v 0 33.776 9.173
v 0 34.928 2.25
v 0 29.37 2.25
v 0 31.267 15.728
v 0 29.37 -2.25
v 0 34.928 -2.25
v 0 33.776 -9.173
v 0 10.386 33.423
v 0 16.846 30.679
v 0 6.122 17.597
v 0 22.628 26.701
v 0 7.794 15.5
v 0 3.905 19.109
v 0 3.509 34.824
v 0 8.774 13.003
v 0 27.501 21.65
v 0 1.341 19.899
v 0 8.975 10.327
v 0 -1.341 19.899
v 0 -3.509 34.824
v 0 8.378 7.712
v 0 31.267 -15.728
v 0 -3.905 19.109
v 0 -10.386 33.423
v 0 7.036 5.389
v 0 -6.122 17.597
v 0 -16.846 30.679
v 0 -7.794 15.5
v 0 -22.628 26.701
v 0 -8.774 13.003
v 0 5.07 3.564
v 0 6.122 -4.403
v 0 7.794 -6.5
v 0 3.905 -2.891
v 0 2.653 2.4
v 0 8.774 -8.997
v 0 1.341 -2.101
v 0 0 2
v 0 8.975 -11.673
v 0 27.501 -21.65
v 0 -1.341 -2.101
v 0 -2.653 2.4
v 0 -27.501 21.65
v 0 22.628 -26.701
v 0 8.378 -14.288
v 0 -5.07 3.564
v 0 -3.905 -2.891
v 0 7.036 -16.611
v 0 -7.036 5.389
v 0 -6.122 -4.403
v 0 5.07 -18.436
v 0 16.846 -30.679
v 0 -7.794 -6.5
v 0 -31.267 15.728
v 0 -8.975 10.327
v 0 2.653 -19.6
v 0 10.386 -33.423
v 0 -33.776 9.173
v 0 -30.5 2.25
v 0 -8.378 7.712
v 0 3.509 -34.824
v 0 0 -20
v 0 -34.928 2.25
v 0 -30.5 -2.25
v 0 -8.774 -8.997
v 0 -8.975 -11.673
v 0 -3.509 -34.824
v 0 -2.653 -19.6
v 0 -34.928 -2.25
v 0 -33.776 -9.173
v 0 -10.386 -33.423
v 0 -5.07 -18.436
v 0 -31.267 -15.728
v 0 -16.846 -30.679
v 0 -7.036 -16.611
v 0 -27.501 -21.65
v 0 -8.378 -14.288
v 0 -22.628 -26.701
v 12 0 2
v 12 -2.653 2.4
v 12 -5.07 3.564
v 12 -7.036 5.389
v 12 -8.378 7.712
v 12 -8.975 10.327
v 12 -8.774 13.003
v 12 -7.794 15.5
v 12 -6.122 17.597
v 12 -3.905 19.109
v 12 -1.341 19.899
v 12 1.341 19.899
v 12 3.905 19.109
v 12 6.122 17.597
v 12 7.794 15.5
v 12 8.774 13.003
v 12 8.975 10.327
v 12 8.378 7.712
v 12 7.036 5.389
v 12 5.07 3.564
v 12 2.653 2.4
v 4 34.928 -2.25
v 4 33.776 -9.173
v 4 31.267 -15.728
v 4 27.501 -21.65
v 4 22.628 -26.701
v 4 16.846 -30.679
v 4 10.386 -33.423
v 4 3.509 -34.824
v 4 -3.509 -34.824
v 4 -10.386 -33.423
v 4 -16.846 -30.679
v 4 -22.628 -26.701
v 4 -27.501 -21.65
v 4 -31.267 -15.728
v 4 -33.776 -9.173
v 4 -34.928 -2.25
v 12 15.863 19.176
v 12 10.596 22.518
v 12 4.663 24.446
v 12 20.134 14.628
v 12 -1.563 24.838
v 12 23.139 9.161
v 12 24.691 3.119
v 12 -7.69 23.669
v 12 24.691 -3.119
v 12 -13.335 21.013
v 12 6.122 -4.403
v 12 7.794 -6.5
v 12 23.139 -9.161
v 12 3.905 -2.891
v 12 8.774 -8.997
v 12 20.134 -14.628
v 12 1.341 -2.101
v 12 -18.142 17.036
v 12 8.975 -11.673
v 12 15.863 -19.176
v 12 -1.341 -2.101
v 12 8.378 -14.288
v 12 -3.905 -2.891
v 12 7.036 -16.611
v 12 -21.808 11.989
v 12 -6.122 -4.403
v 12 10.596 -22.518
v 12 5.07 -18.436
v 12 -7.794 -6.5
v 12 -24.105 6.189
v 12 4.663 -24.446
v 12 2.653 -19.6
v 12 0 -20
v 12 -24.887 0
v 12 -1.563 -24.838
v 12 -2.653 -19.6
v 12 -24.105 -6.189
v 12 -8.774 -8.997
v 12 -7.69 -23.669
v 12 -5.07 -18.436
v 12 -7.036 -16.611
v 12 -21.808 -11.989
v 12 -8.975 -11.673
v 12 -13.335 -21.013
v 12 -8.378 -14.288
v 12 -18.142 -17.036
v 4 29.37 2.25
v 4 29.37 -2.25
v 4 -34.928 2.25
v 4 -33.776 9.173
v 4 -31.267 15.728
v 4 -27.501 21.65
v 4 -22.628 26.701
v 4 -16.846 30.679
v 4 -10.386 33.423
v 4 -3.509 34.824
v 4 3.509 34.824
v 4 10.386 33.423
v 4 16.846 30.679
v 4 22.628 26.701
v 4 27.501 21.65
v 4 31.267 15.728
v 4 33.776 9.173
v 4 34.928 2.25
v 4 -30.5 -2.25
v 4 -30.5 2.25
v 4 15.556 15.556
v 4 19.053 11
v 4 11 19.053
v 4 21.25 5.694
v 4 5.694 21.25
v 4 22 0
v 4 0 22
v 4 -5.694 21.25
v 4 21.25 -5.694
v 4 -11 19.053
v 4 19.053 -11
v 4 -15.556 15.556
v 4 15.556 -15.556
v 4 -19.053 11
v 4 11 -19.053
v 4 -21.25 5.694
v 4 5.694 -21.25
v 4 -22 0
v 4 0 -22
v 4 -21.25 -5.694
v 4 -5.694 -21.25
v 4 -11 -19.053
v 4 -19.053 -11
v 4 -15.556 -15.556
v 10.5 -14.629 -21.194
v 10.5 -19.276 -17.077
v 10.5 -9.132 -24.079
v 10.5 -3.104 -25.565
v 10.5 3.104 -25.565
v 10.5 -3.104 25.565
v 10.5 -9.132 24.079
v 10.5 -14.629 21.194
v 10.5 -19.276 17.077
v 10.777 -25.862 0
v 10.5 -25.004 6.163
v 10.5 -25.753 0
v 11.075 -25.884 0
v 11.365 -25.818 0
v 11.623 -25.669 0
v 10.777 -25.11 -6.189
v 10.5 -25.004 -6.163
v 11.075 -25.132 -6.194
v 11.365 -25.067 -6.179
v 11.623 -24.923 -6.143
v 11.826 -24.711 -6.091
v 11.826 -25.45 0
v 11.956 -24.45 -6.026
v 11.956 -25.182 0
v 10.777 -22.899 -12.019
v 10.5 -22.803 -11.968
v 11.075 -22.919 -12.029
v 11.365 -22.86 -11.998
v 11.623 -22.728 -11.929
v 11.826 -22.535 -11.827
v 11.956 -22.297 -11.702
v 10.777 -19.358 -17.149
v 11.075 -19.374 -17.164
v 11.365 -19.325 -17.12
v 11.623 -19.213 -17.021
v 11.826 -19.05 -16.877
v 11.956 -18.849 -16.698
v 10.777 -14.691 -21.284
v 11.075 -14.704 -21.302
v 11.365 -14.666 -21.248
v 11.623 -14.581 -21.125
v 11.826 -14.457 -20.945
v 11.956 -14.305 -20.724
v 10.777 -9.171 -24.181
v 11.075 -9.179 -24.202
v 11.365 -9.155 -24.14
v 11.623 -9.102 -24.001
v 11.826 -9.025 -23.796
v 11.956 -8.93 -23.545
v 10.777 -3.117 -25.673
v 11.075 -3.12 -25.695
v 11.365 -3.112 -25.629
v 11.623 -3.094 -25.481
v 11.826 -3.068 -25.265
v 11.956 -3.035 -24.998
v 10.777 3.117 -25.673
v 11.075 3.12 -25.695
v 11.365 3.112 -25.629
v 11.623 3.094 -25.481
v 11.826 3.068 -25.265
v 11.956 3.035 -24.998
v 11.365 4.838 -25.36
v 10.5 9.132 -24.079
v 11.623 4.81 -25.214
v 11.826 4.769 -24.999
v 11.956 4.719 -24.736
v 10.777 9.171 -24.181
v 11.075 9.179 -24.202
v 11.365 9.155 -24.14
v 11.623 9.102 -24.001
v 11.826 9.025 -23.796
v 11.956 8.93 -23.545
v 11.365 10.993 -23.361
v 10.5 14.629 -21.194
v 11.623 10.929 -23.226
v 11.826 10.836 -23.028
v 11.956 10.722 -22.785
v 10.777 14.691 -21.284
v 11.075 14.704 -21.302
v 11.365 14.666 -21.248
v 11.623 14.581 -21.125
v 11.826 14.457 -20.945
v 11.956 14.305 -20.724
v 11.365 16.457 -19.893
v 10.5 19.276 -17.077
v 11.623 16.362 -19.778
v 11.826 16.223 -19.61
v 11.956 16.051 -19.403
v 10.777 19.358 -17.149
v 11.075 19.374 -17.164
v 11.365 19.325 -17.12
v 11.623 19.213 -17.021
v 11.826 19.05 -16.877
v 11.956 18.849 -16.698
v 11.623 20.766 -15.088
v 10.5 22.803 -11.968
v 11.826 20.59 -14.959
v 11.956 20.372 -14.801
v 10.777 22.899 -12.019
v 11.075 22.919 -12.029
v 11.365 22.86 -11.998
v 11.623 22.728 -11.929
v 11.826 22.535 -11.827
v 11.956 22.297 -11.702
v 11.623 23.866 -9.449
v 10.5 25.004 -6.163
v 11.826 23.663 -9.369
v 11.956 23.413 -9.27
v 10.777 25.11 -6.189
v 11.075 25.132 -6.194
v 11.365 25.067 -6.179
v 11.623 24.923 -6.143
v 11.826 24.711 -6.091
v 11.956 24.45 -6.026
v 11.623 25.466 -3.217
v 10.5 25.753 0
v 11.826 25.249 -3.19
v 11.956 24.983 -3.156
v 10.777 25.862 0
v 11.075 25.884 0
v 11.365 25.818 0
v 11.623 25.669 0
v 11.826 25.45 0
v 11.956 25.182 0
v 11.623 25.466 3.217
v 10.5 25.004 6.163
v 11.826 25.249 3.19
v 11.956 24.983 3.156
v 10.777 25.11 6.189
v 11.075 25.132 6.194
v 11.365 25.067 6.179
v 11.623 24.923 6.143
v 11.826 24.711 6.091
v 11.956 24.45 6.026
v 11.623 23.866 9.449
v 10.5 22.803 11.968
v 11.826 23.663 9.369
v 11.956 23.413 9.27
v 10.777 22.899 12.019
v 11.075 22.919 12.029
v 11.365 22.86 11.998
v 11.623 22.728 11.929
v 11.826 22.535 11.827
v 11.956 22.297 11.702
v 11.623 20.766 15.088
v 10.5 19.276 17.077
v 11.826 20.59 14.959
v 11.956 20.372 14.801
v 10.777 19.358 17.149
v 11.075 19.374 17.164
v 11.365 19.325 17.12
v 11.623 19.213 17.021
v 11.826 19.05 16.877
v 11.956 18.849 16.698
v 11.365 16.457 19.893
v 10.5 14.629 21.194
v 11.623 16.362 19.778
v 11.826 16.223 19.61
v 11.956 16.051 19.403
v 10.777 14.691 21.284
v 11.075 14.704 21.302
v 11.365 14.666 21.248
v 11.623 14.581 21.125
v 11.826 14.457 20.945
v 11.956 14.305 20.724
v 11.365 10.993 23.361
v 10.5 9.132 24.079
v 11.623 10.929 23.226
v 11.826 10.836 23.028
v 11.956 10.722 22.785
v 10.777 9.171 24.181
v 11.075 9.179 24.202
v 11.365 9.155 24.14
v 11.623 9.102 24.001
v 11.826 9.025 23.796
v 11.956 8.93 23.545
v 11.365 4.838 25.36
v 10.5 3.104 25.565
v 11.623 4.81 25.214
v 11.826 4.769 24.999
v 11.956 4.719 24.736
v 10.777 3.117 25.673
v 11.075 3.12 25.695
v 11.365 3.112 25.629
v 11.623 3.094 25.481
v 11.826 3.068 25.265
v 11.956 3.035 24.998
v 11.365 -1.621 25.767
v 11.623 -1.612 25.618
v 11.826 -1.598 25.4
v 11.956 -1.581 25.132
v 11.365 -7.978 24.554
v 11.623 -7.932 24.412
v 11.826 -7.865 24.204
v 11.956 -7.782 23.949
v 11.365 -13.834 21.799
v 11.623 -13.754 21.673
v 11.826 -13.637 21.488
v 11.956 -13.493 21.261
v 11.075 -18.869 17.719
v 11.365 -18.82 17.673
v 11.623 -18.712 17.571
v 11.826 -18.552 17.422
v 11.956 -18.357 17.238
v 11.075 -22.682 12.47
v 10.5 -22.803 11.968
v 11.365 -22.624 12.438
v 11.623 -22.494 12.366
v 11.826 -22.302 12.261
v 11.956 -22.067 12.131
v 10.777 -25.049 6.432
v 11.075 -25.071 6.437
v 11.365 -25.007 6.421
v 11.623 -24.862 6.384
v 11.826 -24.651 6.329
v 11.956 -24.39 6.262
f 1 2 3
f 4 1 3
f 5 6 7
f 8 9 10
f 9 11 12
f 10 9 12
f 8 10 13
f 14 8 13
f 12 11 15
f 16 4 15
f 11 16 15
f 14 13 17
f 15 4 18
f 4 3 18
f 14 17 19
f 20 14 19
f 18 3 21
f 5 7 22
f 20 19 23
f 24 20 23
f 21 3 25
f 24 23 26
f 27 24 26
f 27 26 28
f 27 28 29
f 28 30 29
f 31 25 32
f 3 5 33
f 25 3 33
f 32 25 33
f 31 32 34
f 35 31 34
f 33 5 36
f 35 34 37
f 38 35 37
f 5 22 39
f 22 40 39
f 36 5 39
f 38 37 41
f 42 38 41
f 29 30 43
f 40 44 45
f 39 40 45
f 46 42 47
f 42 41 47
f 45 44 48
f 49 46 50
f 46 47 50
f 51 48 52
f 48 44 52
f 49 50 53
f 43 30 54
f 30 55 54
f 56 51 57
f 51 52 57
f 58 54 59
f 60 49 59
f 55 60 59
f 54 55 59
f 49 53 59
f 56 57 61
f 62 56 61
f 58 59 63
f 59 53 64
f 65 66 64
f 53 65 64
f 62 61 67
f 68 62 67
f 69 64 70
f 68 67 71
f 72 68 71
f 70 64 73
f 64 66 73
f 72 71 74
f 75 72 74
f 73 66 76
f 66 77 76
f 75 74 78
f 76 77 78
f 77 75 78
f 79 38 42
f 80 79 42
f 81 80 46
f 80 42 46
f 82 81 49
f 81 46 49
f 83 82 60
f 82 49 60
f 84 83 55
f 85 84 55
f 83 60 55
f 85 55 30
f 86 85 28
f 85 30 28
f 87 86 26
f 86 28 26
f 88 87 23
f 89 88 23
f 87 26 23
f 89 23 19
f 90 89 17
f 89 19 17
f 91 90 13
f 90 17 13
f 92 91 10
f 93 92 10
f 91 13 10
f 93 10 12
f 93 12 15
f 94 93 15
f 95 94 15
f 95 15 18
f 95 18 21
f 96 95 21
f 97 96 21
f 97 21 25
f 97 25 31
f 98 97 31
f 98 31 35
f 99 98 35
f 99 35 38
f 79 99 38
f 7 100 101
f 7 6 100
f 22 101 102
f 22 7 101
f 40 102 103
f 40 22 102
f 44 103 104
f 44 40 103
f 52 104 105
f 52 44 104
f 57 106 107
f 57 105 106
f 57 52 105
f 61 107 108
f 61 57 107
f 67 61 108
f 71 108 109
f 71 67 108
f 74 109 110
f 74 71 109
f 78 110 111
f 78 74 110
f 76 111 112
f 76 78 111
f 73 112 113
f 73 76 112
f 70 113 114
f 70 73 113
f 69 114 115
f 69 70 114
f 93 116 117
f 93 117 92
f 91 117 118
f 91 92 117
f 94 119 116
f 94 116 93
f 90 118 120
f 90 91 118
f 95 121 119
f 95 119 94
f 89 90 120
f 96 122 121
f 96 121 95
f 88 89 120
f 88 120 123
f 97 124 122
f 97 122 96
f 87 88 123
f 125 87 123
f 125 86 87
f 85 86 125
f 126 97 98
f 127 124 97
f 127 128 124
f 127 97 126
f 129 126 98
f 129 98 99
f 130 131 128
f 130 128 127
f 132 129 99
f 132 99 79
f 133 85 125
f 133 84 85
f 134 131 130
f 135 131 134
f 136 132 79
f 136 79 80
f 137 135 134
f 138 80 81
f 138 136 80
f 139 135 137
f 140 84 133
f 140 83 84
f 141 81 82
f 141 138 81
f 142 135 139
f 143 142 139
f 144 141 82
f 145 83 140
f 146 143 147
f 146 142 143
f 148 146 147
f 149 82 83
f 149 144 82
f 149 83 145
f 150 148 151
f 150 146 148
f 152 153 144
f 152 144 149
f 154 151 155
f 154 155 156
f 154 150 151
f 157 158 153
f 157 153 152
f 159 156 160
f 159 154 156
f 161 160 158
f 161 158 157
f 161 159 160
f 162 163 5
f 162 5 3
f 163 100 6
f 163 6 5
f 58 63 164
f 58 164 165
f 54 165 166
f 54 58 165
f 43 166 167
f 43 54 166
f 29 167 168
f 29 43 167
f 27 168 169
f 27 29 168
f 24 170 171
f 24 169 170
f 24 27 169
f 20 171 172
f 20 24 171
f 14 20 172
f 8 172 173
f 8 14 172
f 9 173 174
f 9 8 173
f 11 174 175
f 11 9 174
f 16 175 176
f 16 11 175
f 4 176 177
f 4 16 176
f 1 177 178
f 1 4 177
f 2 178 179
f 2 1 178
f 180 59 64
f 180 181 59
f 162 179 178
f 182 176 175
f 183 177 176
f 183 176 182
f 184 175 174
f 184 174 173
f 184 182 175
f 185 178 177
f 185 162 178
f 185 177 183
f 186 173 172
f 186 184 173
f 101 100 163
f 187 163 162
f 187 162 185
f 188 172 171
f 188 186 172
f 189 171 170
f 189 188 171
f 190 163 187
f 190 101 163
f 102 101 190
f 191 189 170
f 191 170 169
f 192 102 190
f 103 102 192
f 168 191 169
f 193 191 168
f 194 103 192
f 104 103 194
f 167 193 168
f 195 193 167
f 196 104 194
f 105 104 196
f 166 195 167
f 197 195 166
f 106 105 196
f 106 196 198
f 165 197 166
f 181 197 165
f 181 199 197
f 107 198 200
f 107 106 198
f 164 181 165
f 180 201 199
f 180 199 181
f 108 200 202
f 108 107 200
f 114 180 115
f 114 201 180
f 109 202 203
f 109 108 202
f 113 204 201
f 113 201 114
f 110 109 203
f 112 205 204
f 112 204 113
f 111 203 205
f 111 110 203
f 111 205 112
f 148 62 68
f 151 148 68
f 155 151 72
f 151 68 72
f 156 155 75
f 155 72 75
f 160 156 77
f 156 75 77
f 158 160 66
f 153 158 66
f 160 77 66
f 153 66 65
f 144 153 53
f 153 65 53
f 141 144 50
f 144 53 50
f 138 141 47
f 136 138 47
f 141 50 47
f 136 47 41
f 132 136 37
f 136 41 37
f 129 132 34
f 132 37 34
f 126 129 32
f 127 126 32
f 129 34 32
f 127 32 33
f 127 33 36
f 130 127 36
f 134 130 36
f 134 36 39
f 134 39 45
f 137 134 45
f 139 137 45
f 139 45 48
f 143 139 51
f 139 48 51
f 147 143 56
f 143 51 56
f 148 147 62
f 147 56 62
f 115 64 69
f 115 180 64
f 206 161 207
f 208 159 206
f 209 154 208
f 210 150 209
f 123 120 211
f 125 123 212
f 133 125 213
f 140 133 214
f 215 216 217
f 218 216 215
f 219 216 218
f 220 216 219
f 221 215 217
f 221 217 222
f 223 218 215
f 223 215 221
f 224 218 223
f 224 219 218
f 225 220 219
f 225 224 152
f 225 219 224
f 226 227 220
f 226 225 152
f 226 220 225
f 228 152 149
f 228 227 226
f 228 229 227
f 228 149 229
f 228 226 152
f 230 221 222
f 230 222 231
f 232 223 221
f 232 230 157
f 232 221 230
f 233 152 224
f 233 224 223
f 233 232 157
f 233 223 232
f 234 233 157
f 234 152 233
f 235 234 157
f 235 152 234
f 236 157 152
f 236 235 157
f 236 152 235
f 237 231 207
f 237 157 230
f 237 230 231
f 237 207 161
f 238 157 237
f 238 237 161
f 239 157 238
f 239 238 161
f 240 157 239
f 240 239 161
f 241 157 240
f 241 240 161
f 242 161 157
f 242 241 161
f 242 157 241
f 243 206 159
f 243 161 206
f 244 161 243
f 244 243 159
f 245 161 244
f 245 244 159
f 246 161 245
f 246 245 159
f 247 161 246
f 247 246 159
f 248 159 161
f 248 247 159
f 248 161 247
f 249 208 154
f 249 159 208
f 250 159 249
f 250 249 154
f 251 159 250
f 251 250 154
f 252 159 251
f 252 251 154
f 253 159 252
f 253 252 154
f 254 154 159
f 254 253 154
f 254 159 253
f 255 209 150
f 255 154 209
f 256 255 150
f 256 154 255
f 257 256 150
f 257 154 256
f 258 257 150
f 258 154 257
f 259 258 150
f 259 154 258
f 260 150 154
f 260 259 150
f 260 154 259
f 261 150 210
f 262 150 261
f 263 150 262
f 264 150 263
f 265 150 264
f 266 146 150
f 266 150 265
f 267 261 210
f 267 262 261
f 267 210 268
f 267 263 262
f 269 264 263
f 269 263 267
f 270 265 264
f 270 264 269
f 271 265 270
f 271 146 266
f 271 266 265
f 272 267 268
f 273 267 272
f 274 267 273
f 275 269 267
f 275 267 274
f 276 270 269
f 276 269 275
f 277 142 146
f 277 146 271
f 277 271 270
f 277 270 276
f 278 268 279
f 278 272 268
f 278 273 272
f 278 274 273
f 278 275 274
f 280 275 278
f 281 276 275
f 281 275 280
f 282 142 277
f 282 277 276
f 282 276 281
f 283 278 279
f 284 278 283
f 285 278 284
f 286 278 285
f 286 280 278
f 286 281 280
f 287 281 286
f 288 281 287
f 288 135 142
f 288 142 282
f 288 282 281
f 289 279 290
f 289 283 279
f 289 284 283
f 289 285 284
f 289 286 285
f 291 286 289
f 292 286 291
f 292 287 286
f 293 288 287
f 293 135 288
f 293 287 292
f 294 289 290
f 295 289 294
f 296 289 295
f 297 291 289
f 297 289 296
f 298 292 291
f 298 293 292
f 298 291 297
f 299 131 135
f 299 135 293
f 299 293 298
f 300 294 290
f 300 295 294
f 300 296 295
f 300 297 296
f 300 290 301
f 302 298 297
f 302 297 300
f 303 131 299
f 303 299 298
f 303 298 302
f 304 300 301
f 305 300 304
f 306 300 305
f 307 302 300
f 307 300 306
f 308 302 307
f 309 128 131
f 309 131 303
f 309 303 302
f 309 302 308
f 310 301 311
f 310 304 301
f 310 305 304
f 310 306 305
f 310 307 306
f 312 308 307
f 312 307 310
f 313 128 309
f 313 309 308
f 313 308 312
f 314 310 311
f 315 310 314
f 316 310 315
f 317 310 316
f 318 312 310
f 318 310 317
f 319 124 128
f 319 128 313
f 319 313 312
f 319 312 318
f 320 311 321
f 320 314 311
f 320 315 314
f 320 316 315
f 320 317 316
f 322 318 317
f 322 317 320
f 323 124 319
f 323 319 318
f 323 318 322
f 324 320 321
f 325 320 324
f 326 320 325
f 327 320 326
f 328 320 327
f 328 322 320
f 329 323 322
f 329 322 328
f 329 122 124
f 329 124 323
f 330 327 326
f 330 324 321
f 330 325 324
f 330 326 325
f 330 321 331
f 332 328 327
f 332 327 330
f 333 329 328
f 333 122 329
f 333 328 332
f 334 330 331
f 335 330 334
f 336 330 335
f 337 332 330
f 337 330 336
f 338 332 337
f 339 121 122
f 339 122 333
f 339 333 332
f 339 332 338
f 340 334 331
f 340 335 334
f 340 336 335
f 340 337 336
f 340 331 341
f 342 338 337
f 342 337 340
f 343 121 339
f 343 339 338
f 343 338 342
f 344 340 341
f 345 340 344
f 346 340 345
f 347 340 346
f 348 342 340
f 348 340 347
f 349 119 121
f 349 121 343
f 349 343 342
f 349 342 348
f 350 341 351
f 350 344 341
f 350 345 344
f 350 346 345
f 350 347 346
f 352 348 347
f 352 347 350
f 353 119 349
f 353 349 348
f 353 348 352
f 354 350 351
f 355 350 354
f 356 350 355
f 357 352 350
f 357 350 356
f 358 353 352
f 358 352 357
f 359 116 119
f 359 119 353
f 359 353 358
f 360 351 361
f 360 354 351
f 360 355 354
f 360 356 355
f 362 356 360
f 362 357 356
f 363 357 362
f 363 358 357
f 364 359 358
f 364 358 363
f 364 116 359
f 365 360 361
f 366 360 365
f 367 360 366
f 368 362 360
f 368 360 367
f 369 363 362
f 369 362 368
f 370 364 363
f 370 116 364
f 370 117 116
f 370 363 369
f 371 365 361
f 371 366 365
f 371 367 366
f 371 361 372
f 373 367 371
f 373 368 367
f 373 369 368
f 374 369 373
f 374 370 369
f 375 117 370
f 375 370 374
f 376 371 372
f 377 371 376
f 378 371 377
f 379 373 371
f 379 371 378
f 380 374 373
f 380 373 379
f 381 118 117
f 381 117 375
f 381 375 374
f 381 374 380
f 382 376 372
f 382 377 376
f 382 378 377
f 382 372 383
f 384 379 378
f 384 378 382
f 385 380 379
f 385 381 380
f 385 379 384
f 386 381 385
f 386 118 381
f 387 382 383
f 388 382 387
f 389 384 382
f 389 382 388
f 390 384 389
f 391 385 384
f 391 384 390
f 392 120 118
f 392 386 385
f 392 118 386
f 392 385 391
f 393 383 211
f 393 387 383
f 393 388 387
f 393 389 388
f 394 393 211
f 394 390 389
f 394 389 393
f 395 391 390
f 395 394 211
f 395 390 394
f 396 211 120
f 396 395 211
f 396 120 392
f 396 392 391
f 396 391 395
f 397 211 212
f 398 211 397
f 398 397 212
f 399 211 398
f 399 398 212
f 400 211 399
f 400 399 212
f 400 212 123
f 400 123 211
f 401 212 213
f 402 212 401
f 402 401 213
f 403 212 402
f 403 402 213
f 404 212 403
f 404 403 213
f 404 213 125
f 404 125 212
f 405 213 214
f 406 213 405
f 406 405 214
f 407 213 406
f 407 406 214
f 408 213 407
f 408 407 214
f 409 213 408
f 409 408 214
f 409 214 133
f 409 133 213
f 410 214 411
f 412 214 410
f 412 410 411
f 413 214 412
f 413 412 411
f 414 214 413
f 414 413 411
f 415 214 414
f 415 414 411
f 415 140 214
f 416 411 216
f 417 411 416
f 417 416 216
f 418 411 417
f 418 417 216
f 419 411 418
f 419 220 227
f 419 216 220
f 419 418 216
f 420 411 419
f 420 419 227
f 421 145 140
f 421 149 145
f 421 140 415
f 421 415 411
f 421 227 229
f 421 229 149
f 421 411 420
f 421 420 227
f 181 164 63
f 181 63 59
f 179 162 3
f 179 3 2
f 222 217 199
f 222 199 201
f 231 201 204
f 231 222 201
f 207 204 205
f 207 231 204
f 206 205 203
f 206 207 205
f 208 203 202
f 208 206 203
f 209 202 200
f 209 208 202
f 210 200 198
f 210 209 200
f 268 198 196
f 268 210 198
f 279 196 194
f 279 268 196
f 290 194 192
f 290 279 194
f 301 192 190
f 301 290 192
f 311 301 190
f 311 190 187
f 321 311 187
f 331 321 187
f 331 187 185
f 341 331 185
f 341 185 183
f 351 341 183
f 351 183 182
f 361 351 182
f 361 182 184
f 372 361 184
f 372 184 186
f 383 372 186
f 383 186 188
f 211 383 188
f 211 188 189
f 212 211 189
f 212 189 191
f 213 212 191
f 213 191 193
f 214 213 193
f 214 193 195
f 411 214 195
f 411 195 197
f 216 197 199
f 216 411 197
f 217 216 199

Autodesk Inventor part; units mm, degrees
ref_plane "YZ Plane" through (0, 0, 0) normal (1, 0, 0) x (0, 1, 0)
ref_plane "XZ Plane" through (0, 0, 0) normal (0, 1, 0) x (-1, 0, 0)
ref_plane "XY Plane" through (0, 0, 0) normal (0, 0, 1) x (1, 0, 0)
sketch "Эскиз1" plane through (0, 0, 0) normal (0, 0, 1) x (1, 0, 0)
  line L0 (0, 0) -> (4, 0)
  line L1 (4, 0) -> (4, -35)
  line L2 (4, -35) -> (0, -35)
  line L3 (0, -35) -> (0, 0)
  line L4 (4, 0) -> (12, 0)
  line L5 (12, 0) -> (12, -24.8868)
  line L6 (12, -26.6188) -> (4, -26.6188)
  line L7 (4, -26.6188) -> (4, 0)
  line L8 (4, 0) -> (4, -22)
  line L9 (4, -22) -> (10.5, -25.7528)
  arc A0 (10.5, -25.7528) -> (12, -24.8868) centre (11, -24.8868) ccw
  dimension "d0" = 4
  dimension "d1" = 35
  dimension "d2" = 8
  dimension "d4" = 22
  dimension "d36" = 60
  dimension "d37" = 1
revolve "Вращение1" add sketch "Эскиз1" angle 360 about axis through (0, 0, 0) along (1, 0, 0)
mirror "Зеркальное отражение1" [suppressed]
sketch "Эскиз2" plane through (12, 0, 0) normal (1, 0, 0) x (0, 0, -1)
  circle A0 centre (11, 0) radius 9
  circle A1 centre (-11, 0) radius 9
  point P0 (0, 0)
  dimension "d6" = 18
  dimension "d7" = 18
  dimension "d8" = 11
  dimension "d9" = 11
  dimension "d10" = 40
hole "Отверстие1" at (12, 0, 11) direction (-1, 0, 0) diameter 18 end through all
hole "Отверстие2" at (12, 0, -11) direction (-1, 0, 0) diameter 18 end through all
sketch "Эскиз3" plane through (4, 0, 0) normal (1, 0, 0) x (0, 0, -1)
  line L0 (-2.25, 35) -> (2.25, 35)
  line L1 (2.25, 35) -> (2.25, 29.3705)
  line L2 (2.25, 29.3705) -> (-2.25, 29.3705)
  line L3 (-2.25, 29.3705) -> (-2.25, 35)
  circle A0 centre (0, 0) radius 35 projected
  line L4 (0, 35) -> (0, 30.5)
  line L5 (0, -35) -> (0, -30.5)
  line L6 (-2.25, -30.5) -> (2.25, -30.5)
  line L7 (2.25, -30.5) -> (2.25, -35)
  line L8 (2.25, -35) -> (-2.25, -35)
  line L9 (-2.25, -35) -> (-2.25, -30.5)
  point P0 (0, 0)
  dimension "d25" = 4.5
  dimension "d26" = 4.5
  dimension "d27" = 2.25
  dimension "d28" = 0
  dimension "d29" = 4.5
  dimension "d30" = 4.5
  dimension "d31" = 4.5
  dimension "d32" = 2.25
  dimension "d33" = 0
extrude "Выдавливание1" cut sketch "Эскиз3" against normal blind 4 contours L0 A0 L3 | L0 L1 A0 | A0 L1 L2 L3 | L9 L6 L5 A0 | A0 L8 L9 | L5 L6 L7 A0 | A0 L7 L8
equation "\"d0\" = 0.5 * hFlange"
equation "\"d1\" = 0.5 * dOuter"
equation "\"d2\" = hMount"
equation "\"d4\" = 0.5 * dMinimal"
equation "\"d36\" = angleMount"
equation "\"d6\" = dHoles"
equation "\"d7\" = dHoles"
equation "\"d8\" = r2holes"
equation "\"d9\" = r2holes"
equation "\"d11\" = dHoles"
equation "\"d18\" = dHoles"
equation "\"d25\" = wSlot"
equation "\"d26\" = hSlot"
equation "\"d27\" = 0.5 * wSlot"
equation "\"d29\" = hSlot"
equation "\"d30\" = hSlot"
equation "\"d31\" = wSlot"
equation "\"d32\" = 0.5 * wSlot"
equation "\"hFlange\" = 8"
equation "\"dMinimal\" = 44"
equation "\"angleMount\" = 60deg"
equation "\"dHoles\" = 18"
equation "\"r2holes\" = 11"
equation "\"hMount\" = 8"
equation "\"wSlot\" = 4.5"
equation "\"hSlot\" = 4.5"
equation "\"dOuter\" = 70"
properties part number "SpacerCorrect"
